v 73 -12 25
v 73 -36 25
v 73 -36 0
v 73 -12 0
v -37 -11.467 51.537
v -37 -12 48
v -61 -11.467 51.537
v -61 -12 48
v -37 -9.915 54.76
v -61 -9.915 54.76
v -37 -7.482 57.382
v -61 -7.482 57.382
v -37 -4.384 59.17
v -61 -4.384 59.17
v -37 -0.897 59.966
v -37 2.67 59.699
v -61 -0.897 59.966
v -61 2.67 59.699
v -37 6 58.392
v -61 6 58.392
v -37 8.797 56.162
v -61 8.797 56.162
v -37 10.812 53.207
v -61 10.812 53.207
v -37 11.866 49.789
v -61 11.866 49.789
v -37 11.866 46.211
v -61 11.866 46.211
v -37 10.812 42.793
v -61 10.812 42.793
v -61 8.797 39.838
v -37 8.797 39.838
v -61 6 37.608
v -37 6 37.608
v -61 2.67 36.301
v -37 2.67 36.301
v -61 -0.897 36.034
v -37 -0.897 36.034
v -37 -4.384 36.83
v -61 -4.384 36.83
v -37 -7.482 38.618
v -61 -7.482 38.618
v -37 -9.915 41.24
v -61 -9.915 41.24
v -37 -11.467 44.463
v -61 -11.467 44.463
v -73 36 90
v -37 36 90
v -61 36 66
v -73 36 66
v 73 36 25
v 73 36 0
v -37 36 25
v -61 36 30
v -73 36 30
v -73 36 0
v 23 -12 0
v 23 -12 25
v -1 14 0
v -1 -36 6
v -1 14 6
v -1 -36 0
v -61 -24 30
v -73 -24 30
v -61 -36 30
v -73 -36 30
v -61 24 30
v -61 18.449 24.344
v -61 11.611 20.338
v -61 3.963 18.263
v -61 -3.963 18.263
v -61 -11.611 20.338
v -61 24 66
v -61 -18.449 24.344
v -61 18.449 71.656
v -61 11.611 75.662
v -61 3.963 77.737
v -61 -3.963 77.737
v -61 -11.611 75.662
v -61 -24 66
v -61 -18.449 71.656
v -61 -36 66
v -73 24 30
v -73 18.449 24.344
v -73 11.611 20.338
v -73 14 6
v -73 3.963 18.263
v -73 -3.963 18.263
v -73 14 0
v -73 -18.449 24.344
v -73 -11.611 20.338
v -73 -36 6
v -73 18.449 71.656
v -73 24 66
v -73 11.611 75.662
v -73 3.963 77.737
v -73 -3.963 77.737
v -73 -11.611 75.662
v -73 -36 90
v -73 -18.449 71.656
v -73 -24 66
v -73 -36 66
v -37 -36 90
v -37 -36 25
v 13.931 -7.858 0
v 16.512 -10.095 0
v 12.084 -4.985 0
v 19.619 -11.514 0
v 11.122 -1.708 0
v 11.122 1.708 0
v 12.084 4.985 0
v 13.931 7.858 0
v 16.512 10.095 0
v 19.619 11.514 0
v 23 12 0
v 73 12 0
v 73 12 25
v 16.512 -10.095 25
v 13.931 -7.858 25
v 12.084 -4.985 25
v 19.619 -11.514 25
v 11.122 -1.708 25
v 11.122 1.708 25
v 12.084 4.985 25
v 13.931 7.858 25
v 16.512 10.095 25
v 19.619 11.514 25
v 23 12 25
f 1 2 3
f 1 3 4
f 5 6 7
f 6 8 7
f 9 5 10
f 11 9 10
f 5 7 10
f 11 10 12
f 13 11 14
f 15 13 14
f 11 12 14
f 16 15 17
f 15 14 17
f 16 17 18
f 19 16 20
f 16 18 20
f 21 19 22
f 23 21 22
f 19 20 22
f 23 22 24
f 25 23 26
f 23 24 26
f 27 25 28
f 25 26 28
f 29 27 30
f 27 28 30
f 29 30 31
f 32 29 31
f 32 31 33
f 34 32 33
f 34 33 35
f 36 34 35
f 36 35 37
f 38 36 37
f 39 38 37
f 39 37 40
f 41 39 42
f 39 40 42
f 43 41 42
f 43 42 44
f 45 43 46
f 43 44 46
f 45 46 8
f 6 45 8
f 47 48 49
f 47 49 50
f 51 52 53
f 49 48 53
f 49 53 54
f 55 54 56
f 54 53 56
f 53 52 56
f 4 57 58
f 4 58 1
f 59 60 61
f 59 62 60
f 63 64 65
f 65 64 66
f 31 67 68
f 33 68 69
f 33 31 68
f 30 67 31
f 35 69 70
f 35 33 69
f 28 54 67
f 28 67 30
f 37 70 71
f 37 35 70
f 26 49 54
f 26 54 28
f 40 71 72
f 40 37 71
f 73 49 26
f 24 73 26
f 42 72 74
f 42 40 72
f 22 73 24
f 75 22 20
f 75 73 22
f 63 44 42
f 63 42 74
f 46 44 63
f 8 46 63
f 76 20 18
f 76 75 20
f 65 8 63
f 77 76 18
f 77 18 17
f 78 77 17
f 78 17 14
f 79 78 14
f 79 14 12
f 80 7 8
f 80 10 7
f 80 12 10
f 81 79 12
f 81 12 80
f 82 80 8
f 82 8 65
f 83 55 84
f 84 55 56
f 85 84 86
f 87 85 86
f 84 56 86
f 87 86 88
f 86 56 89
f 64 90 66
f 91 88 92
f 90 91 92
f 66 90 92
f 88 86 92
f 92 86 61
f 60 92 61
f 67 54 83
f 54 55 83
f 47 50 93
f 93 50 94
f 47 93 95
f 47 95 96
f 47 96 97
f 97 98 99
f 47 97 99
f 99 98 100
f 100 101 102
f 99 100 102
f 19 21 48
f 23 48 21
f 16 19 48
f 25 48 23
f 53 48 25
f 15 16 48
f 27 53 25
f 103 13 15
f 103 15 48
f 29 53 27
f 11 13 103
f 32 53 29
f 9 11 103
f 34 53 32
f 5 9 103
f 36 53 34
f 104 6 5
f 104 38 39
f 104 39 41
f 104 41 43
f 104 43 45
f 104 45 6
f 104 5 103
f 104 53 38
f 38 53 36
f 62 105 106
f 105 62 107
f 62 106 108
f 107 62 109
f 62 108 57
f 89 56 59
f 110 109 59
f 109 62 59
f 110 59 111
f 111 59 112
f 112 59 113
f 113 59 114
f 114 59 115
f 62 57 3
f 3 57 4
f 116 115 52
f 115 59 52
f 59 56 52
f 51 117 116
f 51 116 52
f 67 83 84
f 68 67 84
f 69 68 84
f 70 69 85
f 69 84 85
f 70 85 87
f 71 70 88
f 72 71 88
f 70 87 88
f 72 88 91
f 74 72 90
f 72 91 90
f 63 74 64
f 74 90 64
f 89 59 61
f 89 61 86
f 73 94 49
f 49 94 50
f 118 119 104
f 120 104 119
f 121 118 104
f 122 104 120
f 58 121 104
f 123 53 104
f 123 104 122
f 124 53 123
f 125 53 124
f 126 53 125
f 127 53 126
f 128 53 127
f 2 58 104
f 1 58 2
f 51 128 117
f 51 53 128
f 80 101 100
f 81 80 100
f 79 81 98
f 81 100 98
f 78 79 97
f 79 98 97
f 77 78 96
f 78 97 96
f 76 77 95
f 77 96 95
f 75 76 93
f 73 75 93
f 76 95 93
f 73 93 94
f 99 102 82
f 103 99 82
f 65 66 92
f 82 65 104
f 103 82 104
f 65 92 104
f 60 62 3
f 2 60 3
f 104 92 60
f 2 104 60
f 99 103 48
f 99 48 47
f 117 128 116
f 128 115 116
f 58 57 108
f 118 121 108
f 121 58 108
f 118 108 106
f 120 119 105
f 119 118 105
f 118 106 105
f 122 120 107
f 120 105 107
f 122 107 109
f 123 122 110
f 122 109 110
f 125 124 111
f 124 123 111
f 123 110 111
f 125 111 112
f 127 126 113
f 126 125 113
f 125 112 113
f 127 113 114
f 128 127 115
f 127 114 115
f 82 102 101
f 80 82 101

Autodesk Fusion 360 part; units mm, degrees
sketch "Sketch1" plane through (0, 0, 0) normal (0, 0, 1) x (1, 0, 0)
  line L0 (73, 36) -> (-73, 36)
  line L1 (-73, 36) -> (-73, -36)
  line L2 (-73, -36) -> (73, -36)
  line L3 (73, -36) -> (73, 36)
  line L4 (73, 36) -> (-73, -36) construction
  line L5 (-73, 36) -> (73, -36) construction
  line L6 (-73, -36) -> (-1, -36)
  line L7 (-1, -36) -> (-1, 14)
  line L8 (-1, 14) -> (-73, 14)
  line L9 (-73, 14) -> (-73, -36)
  line L10 (23, 12) -> (73, 12)
  line L11 (23, -12) -> (73, -12)
  arc A0 (24.2094, 11.9389) -> (24.2094, -11.9389) centre (23, 0) ccw
  dimension "d1" = 146
  dimension "d2" = 72
  dimension "d3" = 72
  dimension "d4" = 50
  dimension "d5" = 24
  dimension "d6" = 50
extrude "Extrude1" add sketch "Sketch1" along normal blind 25 contours L0 L1 L2 L3 L7 L8 L10 L11 A0 | L1 L2 L6 L7 L8 L9
extrude "Extrude2" cut sketch "Sketch1" along normal blind 6 contours L1 L2 L6 L7 L8 L9
sketch "Sketch2" plane through (0, 0, 25) normal (0, 0, 1) x (-1, 0, 0)
  arc A0 (-23, -12) -> (-23, 12) centre (-23, 0) ccw
  line L0 (-23, -12) -> (-73, -12)
  line L1 (-73, -12) -> (-73, -36)
  line L2 (-73, -36) -> (73, -36)
  line L3 (73, -36) -> (73, 36)
  line L4 (73, 36) -> (-73, 36)
  line L5 (-73, 36) -> (-73, 12)
  line L6 (-73, 12) -> (-23, 12)
  line L7 (73, -36) -> (37, -36)
  line L8 (37, -36) -> (37, 36)
  line L9 (37, 36) -> (73, 36)
  line L10 (73, 36) -> (73, -36)
  dimension "d11" = 36
extrude "Extrude3" add sketch "Sketch2" along normal blind 65 contours L2 L3 L4 L7 L8 L9 L10
sketch "Sketch3" plane through (-73, 0, 0) normal (-1, 0, 0) x (0, -1, 0)
  line L0 (-14, 0) -> (-14, 6)
  line L1 (-14, 6) -> (36, 6)
  line L2 (36, 6) -> (36, 90)
  line L3 (36, 90) -> (-36, 90)
  line L4 (-36, 90) -> (-36, 0)
  line L5 (-36, 0) -> (-14, 0)
  circle A0 centre (0, 48) radius 12
  circle A1 centre (0, 48) radius 30
  line L6 (-36, 90) -> (36, 90)
  line L7 (36, 90) -> (36, 66)
  line L8 (36, 66) -> (-36, 66)
  line L9 (-36, 66) -> (-36, 90)
  line L10 (36, 6) -> (-36, 6)
  line L11 (-36, 6) -> (-36, 30)
  line L12 (-36, 30) -> (36, 30)
  line L13 (36, 30) -> (36, 6)
  dimension "d14" = 24
  dimension "d15" = 60
  dimension "d16" = 48
  dimension "d17" = 24
  dimension "d18" = 24
extrude "Extrude4" cut sketch "Sketch3" against normal through all contours A0
extrude "Extrude5" cut sketch "Sketch3" against normal blind 12 contours L2 A1 L8 L12 | L4 A1 L8 L12 | A1 L8 L12 | A1 L12 | A1 L8
